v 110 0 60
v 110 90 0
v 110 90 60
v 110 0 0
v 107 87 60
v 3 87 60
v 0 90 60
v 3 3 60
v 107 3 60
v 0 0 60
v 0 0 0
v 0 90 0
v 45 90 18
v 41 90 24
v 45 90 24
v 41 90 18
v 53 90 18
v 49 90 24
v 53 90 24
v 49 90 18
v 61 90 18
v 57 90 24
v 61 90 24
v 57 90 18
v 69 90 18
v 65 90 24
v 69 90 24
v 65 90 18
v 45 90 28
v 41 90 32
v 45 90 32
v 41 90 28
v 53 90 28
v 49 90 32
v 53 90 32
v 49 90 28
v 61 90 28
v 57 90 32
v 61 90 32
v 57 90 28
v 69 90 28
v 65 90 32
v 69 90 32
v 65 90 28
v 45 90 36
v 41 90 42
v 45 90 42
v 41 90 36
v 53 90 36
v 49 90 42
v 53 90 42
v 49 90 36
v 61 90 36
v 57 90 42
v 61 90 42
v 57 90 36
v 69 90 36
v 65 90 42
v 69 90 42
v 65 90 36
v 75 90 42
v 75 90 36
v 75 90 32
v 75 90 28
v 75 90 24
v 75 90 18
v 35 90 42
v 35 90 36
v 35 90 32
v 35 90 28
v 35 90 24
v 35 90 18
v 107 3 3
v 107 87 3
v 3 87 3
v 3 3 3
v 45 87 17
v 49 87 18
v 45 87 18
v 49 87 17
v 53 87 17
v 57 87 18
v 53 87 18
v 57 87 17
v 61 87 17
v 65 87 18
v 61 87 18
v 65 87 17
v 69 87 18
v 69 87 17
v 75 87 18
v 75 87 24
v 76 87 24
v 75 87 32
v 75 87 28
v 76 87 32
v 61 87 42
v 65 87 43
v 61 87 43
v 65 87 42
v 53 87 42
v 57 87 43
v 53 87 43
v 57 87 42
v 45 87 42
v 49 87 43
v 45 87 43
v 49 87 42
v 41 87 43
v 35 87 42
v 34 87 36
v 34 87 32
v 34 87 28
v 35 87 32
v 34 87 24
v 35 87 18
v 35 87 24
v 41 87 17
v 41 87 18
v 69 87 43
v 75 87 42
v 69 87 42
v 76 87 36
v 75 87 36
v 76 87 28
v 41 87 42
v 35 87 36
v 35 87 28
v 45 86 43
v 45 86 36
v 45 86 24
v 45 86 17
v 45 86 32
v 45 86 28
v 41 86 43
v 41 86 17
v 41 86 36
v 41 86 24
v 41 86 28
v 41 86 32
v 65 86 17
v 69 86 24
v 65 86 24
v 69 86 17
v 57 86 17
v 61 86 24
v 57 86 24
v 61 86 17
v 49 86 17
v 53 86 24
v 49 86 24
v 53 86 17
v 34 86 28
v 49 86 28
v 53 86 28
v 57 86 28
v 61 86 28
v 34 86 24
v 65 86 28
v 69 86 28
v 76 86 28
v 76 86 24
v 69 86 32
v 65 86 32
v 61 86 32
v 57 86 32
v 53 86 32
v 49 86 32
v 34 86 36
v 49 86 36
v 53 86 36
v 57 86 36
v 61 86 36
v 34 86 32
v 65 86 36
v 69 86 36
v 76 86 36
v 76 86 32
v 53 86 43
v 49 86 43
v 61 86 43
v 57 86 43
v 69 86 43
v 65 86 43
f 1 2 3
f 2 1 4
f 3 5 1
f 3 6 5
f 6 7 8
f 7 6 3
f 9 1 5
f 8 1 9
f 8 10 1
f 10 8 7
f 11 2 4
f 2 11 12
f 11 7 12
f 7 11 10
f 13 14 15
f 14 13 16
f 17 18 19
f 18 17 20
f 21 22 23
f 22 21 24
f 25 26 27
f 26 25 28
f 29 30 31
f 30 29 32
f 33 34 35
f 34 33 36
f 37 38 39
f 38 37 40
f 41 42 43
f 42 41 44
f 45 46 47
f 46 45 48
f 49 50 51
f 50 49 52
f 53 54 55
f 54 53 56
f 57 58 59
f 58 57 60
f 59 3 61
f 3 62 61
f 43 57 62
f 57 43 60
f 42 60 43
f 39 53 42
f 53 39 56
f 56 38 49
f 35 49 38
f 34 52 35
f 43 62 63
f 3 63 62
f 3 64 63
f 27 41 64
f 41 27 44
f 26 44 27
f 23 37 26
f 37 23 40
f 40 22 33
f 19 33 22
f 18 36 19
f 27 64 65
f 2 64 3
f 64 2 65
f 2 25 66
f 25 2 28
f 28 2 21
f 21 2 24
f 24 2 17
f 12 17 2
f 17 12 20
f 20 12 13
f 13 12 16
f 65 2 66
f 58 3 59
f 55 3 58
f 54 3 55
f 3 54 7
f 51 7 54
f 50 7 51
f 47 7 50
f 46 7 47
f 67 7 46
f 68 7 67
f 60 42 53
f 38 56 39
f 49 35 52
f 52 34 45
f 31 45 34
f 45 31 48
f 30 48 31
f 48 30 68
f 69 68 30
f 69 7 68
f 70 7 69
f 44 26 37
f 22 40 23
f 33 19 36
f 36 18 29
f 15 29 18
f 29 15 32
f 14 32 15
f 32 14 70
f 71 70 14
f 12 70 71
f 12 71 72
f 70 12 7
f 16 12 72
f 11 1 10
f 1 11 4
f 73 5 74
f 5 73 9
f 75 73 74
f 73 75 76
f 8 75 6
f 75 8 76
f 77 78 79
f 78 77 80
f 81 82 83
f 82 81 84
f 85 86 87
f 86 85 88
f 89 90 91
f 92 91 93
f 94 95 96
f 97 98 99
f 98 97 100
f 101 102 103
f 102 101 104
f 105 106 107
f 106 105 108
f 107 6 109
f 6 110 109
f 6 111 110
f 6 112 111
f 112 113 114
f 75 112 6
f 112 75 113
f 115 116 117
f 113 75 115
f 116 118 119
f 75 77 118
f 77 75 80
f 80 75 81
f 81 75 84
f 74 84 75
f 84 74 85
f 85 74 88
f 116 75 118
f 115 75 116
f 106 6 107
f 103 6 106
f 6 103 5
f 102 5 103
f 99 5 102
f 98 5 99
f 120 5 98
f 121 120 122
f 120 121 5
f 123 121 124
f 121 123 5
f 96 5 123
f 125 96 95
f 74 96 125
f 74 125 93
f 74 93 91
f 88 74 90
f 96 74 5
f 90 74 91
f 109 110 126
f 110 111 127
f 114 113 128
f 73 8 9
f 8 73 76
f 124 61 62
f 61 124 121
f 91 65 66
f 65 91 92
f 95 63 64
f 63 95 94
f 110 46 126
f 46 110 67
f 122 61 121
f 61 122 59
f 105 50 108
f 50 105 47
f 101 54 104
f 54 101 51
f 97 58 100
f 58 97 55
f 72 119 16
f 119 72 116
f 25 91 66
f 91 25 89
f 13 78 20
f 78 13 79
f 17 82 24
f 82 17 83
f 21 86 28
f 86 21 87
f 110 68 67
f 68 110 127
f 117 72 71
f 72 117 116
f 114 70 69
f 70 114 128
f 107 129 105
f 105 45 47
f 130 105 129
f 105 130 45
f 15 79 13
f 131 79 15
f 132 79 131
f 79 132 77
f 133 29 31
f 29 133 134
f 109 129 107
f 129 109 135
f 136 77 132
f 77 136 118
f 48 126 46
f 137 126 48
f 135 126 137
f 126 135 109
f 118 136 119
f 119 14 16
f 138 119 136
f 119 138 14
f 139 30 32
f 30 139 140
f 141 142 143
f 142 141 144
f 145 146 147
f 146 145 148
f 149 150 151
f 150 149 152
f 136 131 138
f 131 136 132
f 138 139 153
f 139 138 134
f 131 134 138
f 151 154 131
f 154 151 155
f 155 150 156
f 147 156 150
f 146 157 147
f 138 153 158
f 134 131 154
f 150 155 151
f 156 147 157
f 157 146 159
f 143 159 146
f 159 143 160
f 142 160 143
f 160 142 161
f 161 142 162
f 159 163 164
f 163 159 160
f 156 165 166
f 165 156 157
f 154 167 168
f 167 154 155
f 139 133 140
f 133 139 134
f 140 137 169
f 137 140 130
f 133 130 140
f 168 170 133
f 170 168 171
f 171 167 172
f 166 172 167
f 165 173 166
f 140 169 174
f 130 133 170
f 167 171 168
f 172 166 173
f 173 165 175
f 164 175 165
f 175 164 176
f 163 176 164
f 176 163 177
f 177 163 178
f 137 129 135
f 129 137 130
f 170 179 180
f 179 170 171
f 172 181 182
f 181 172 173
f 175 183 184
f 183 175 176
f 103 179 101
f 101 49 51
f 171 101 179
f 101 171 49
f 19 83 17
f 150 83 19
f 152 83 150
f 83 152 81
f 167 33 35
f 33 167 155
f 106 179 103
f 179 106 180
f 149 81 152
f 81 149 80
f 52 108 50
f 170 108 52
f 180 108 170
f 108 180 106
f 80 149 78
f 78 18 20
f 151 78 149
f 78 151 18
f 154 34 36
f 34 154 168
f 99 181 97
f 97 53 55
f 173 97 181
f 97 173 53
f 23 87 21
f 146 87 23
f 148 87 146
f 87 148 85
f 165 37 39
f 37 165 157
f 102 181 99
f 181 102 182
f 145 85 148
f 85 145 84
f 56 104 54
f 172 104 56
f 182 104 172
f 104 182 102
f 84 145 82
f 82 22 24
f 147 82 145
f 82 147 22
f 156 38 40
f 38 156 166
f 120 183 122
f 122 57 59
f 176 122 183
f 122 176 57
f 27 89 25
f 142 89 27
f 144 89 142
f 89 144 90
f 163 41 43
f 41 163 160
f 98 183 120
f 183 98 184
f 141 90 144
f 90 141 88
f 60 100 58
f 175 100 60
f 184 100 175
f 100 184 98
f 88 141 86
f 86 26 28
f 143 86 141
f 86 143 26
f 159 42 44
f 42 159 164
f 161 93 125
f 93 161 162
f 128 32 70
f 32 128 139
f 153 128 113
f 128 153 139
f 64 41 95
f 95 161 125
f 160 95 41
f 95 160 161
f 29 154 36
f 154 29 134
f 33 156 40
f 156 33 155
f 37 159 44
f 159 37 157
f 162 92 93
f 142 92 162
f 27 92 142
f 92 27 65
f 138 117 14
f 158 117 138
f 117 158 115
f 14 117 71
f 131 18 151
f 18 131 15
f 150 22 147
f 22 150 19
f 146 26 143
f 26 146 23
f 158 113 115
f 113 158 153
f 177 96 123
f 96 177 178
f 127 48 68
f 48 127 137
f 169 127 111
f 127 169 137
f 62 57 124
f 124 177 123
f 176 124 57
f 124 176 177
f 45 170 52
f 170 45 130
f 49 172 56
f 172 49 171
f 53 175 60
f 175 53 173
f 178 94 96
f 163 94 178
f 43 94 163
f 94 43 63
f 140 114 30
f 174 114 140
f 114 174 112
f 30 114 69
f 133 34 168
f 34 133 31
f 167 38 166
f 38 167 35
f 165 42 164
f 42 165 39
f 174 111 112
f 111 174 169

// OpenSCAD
$fn = 32;

// ----------------------------------------------------------------------
// Vent box: crossgrid enclosure
// ----------------------------------------------------------------------

// --- parameters (mm) ---
box_l = 110;              // box length, X
box_w = 90;               // box width, Y
box_h = 60;               // box height, Z
wall_t = 3;               // shell wall thickness
win_l = 40;               // vent window width, X
win_h = 24;               // vent window height, Z
bar_w = 4;                // grid bar width
n_v = 4;                  // vertical bar count
n_h = 2;                  // horizontal bar count

win_z0 = (box_h - win_h) / 2;  // window lower edge Z
v_step = win_l / (n_v + 1);  // vertical bar step
h_step = win_h / (n_h + 1);  // horizontal bar step

difference() {
  union() {
    difference() {
      cube([box_l, box_w, box_h]);
  translate([wall_t, wall_t, wall_t])
    cube([box_l - 2 * wall_t, box_w - 2 * wall_t, box_h]);
  translate([(box_l - win_l) / 2, box_w - wall_t - 1, win_z0])
    cube([win_l, wall_t + 2, win_h]);
    }
    for (i = [1 : n_v])
      translate([(box_l - win_l) / 2 + i * v_step - bar_w / 2,
                 box_w - wall_t - 1, win_z0 - 1])
        cube([bar_w, wall_t + 1, win_h + 2]);
    for (i = [1 : n_h])
      translate([(box_l - win_l) / 2 - 1, box_w - wall_t - 1,
                 win_z0 + i * h_step - bar_w / 2])
        cube([win_l + 2, wall_t + 1, bar_w]);
  }
}
